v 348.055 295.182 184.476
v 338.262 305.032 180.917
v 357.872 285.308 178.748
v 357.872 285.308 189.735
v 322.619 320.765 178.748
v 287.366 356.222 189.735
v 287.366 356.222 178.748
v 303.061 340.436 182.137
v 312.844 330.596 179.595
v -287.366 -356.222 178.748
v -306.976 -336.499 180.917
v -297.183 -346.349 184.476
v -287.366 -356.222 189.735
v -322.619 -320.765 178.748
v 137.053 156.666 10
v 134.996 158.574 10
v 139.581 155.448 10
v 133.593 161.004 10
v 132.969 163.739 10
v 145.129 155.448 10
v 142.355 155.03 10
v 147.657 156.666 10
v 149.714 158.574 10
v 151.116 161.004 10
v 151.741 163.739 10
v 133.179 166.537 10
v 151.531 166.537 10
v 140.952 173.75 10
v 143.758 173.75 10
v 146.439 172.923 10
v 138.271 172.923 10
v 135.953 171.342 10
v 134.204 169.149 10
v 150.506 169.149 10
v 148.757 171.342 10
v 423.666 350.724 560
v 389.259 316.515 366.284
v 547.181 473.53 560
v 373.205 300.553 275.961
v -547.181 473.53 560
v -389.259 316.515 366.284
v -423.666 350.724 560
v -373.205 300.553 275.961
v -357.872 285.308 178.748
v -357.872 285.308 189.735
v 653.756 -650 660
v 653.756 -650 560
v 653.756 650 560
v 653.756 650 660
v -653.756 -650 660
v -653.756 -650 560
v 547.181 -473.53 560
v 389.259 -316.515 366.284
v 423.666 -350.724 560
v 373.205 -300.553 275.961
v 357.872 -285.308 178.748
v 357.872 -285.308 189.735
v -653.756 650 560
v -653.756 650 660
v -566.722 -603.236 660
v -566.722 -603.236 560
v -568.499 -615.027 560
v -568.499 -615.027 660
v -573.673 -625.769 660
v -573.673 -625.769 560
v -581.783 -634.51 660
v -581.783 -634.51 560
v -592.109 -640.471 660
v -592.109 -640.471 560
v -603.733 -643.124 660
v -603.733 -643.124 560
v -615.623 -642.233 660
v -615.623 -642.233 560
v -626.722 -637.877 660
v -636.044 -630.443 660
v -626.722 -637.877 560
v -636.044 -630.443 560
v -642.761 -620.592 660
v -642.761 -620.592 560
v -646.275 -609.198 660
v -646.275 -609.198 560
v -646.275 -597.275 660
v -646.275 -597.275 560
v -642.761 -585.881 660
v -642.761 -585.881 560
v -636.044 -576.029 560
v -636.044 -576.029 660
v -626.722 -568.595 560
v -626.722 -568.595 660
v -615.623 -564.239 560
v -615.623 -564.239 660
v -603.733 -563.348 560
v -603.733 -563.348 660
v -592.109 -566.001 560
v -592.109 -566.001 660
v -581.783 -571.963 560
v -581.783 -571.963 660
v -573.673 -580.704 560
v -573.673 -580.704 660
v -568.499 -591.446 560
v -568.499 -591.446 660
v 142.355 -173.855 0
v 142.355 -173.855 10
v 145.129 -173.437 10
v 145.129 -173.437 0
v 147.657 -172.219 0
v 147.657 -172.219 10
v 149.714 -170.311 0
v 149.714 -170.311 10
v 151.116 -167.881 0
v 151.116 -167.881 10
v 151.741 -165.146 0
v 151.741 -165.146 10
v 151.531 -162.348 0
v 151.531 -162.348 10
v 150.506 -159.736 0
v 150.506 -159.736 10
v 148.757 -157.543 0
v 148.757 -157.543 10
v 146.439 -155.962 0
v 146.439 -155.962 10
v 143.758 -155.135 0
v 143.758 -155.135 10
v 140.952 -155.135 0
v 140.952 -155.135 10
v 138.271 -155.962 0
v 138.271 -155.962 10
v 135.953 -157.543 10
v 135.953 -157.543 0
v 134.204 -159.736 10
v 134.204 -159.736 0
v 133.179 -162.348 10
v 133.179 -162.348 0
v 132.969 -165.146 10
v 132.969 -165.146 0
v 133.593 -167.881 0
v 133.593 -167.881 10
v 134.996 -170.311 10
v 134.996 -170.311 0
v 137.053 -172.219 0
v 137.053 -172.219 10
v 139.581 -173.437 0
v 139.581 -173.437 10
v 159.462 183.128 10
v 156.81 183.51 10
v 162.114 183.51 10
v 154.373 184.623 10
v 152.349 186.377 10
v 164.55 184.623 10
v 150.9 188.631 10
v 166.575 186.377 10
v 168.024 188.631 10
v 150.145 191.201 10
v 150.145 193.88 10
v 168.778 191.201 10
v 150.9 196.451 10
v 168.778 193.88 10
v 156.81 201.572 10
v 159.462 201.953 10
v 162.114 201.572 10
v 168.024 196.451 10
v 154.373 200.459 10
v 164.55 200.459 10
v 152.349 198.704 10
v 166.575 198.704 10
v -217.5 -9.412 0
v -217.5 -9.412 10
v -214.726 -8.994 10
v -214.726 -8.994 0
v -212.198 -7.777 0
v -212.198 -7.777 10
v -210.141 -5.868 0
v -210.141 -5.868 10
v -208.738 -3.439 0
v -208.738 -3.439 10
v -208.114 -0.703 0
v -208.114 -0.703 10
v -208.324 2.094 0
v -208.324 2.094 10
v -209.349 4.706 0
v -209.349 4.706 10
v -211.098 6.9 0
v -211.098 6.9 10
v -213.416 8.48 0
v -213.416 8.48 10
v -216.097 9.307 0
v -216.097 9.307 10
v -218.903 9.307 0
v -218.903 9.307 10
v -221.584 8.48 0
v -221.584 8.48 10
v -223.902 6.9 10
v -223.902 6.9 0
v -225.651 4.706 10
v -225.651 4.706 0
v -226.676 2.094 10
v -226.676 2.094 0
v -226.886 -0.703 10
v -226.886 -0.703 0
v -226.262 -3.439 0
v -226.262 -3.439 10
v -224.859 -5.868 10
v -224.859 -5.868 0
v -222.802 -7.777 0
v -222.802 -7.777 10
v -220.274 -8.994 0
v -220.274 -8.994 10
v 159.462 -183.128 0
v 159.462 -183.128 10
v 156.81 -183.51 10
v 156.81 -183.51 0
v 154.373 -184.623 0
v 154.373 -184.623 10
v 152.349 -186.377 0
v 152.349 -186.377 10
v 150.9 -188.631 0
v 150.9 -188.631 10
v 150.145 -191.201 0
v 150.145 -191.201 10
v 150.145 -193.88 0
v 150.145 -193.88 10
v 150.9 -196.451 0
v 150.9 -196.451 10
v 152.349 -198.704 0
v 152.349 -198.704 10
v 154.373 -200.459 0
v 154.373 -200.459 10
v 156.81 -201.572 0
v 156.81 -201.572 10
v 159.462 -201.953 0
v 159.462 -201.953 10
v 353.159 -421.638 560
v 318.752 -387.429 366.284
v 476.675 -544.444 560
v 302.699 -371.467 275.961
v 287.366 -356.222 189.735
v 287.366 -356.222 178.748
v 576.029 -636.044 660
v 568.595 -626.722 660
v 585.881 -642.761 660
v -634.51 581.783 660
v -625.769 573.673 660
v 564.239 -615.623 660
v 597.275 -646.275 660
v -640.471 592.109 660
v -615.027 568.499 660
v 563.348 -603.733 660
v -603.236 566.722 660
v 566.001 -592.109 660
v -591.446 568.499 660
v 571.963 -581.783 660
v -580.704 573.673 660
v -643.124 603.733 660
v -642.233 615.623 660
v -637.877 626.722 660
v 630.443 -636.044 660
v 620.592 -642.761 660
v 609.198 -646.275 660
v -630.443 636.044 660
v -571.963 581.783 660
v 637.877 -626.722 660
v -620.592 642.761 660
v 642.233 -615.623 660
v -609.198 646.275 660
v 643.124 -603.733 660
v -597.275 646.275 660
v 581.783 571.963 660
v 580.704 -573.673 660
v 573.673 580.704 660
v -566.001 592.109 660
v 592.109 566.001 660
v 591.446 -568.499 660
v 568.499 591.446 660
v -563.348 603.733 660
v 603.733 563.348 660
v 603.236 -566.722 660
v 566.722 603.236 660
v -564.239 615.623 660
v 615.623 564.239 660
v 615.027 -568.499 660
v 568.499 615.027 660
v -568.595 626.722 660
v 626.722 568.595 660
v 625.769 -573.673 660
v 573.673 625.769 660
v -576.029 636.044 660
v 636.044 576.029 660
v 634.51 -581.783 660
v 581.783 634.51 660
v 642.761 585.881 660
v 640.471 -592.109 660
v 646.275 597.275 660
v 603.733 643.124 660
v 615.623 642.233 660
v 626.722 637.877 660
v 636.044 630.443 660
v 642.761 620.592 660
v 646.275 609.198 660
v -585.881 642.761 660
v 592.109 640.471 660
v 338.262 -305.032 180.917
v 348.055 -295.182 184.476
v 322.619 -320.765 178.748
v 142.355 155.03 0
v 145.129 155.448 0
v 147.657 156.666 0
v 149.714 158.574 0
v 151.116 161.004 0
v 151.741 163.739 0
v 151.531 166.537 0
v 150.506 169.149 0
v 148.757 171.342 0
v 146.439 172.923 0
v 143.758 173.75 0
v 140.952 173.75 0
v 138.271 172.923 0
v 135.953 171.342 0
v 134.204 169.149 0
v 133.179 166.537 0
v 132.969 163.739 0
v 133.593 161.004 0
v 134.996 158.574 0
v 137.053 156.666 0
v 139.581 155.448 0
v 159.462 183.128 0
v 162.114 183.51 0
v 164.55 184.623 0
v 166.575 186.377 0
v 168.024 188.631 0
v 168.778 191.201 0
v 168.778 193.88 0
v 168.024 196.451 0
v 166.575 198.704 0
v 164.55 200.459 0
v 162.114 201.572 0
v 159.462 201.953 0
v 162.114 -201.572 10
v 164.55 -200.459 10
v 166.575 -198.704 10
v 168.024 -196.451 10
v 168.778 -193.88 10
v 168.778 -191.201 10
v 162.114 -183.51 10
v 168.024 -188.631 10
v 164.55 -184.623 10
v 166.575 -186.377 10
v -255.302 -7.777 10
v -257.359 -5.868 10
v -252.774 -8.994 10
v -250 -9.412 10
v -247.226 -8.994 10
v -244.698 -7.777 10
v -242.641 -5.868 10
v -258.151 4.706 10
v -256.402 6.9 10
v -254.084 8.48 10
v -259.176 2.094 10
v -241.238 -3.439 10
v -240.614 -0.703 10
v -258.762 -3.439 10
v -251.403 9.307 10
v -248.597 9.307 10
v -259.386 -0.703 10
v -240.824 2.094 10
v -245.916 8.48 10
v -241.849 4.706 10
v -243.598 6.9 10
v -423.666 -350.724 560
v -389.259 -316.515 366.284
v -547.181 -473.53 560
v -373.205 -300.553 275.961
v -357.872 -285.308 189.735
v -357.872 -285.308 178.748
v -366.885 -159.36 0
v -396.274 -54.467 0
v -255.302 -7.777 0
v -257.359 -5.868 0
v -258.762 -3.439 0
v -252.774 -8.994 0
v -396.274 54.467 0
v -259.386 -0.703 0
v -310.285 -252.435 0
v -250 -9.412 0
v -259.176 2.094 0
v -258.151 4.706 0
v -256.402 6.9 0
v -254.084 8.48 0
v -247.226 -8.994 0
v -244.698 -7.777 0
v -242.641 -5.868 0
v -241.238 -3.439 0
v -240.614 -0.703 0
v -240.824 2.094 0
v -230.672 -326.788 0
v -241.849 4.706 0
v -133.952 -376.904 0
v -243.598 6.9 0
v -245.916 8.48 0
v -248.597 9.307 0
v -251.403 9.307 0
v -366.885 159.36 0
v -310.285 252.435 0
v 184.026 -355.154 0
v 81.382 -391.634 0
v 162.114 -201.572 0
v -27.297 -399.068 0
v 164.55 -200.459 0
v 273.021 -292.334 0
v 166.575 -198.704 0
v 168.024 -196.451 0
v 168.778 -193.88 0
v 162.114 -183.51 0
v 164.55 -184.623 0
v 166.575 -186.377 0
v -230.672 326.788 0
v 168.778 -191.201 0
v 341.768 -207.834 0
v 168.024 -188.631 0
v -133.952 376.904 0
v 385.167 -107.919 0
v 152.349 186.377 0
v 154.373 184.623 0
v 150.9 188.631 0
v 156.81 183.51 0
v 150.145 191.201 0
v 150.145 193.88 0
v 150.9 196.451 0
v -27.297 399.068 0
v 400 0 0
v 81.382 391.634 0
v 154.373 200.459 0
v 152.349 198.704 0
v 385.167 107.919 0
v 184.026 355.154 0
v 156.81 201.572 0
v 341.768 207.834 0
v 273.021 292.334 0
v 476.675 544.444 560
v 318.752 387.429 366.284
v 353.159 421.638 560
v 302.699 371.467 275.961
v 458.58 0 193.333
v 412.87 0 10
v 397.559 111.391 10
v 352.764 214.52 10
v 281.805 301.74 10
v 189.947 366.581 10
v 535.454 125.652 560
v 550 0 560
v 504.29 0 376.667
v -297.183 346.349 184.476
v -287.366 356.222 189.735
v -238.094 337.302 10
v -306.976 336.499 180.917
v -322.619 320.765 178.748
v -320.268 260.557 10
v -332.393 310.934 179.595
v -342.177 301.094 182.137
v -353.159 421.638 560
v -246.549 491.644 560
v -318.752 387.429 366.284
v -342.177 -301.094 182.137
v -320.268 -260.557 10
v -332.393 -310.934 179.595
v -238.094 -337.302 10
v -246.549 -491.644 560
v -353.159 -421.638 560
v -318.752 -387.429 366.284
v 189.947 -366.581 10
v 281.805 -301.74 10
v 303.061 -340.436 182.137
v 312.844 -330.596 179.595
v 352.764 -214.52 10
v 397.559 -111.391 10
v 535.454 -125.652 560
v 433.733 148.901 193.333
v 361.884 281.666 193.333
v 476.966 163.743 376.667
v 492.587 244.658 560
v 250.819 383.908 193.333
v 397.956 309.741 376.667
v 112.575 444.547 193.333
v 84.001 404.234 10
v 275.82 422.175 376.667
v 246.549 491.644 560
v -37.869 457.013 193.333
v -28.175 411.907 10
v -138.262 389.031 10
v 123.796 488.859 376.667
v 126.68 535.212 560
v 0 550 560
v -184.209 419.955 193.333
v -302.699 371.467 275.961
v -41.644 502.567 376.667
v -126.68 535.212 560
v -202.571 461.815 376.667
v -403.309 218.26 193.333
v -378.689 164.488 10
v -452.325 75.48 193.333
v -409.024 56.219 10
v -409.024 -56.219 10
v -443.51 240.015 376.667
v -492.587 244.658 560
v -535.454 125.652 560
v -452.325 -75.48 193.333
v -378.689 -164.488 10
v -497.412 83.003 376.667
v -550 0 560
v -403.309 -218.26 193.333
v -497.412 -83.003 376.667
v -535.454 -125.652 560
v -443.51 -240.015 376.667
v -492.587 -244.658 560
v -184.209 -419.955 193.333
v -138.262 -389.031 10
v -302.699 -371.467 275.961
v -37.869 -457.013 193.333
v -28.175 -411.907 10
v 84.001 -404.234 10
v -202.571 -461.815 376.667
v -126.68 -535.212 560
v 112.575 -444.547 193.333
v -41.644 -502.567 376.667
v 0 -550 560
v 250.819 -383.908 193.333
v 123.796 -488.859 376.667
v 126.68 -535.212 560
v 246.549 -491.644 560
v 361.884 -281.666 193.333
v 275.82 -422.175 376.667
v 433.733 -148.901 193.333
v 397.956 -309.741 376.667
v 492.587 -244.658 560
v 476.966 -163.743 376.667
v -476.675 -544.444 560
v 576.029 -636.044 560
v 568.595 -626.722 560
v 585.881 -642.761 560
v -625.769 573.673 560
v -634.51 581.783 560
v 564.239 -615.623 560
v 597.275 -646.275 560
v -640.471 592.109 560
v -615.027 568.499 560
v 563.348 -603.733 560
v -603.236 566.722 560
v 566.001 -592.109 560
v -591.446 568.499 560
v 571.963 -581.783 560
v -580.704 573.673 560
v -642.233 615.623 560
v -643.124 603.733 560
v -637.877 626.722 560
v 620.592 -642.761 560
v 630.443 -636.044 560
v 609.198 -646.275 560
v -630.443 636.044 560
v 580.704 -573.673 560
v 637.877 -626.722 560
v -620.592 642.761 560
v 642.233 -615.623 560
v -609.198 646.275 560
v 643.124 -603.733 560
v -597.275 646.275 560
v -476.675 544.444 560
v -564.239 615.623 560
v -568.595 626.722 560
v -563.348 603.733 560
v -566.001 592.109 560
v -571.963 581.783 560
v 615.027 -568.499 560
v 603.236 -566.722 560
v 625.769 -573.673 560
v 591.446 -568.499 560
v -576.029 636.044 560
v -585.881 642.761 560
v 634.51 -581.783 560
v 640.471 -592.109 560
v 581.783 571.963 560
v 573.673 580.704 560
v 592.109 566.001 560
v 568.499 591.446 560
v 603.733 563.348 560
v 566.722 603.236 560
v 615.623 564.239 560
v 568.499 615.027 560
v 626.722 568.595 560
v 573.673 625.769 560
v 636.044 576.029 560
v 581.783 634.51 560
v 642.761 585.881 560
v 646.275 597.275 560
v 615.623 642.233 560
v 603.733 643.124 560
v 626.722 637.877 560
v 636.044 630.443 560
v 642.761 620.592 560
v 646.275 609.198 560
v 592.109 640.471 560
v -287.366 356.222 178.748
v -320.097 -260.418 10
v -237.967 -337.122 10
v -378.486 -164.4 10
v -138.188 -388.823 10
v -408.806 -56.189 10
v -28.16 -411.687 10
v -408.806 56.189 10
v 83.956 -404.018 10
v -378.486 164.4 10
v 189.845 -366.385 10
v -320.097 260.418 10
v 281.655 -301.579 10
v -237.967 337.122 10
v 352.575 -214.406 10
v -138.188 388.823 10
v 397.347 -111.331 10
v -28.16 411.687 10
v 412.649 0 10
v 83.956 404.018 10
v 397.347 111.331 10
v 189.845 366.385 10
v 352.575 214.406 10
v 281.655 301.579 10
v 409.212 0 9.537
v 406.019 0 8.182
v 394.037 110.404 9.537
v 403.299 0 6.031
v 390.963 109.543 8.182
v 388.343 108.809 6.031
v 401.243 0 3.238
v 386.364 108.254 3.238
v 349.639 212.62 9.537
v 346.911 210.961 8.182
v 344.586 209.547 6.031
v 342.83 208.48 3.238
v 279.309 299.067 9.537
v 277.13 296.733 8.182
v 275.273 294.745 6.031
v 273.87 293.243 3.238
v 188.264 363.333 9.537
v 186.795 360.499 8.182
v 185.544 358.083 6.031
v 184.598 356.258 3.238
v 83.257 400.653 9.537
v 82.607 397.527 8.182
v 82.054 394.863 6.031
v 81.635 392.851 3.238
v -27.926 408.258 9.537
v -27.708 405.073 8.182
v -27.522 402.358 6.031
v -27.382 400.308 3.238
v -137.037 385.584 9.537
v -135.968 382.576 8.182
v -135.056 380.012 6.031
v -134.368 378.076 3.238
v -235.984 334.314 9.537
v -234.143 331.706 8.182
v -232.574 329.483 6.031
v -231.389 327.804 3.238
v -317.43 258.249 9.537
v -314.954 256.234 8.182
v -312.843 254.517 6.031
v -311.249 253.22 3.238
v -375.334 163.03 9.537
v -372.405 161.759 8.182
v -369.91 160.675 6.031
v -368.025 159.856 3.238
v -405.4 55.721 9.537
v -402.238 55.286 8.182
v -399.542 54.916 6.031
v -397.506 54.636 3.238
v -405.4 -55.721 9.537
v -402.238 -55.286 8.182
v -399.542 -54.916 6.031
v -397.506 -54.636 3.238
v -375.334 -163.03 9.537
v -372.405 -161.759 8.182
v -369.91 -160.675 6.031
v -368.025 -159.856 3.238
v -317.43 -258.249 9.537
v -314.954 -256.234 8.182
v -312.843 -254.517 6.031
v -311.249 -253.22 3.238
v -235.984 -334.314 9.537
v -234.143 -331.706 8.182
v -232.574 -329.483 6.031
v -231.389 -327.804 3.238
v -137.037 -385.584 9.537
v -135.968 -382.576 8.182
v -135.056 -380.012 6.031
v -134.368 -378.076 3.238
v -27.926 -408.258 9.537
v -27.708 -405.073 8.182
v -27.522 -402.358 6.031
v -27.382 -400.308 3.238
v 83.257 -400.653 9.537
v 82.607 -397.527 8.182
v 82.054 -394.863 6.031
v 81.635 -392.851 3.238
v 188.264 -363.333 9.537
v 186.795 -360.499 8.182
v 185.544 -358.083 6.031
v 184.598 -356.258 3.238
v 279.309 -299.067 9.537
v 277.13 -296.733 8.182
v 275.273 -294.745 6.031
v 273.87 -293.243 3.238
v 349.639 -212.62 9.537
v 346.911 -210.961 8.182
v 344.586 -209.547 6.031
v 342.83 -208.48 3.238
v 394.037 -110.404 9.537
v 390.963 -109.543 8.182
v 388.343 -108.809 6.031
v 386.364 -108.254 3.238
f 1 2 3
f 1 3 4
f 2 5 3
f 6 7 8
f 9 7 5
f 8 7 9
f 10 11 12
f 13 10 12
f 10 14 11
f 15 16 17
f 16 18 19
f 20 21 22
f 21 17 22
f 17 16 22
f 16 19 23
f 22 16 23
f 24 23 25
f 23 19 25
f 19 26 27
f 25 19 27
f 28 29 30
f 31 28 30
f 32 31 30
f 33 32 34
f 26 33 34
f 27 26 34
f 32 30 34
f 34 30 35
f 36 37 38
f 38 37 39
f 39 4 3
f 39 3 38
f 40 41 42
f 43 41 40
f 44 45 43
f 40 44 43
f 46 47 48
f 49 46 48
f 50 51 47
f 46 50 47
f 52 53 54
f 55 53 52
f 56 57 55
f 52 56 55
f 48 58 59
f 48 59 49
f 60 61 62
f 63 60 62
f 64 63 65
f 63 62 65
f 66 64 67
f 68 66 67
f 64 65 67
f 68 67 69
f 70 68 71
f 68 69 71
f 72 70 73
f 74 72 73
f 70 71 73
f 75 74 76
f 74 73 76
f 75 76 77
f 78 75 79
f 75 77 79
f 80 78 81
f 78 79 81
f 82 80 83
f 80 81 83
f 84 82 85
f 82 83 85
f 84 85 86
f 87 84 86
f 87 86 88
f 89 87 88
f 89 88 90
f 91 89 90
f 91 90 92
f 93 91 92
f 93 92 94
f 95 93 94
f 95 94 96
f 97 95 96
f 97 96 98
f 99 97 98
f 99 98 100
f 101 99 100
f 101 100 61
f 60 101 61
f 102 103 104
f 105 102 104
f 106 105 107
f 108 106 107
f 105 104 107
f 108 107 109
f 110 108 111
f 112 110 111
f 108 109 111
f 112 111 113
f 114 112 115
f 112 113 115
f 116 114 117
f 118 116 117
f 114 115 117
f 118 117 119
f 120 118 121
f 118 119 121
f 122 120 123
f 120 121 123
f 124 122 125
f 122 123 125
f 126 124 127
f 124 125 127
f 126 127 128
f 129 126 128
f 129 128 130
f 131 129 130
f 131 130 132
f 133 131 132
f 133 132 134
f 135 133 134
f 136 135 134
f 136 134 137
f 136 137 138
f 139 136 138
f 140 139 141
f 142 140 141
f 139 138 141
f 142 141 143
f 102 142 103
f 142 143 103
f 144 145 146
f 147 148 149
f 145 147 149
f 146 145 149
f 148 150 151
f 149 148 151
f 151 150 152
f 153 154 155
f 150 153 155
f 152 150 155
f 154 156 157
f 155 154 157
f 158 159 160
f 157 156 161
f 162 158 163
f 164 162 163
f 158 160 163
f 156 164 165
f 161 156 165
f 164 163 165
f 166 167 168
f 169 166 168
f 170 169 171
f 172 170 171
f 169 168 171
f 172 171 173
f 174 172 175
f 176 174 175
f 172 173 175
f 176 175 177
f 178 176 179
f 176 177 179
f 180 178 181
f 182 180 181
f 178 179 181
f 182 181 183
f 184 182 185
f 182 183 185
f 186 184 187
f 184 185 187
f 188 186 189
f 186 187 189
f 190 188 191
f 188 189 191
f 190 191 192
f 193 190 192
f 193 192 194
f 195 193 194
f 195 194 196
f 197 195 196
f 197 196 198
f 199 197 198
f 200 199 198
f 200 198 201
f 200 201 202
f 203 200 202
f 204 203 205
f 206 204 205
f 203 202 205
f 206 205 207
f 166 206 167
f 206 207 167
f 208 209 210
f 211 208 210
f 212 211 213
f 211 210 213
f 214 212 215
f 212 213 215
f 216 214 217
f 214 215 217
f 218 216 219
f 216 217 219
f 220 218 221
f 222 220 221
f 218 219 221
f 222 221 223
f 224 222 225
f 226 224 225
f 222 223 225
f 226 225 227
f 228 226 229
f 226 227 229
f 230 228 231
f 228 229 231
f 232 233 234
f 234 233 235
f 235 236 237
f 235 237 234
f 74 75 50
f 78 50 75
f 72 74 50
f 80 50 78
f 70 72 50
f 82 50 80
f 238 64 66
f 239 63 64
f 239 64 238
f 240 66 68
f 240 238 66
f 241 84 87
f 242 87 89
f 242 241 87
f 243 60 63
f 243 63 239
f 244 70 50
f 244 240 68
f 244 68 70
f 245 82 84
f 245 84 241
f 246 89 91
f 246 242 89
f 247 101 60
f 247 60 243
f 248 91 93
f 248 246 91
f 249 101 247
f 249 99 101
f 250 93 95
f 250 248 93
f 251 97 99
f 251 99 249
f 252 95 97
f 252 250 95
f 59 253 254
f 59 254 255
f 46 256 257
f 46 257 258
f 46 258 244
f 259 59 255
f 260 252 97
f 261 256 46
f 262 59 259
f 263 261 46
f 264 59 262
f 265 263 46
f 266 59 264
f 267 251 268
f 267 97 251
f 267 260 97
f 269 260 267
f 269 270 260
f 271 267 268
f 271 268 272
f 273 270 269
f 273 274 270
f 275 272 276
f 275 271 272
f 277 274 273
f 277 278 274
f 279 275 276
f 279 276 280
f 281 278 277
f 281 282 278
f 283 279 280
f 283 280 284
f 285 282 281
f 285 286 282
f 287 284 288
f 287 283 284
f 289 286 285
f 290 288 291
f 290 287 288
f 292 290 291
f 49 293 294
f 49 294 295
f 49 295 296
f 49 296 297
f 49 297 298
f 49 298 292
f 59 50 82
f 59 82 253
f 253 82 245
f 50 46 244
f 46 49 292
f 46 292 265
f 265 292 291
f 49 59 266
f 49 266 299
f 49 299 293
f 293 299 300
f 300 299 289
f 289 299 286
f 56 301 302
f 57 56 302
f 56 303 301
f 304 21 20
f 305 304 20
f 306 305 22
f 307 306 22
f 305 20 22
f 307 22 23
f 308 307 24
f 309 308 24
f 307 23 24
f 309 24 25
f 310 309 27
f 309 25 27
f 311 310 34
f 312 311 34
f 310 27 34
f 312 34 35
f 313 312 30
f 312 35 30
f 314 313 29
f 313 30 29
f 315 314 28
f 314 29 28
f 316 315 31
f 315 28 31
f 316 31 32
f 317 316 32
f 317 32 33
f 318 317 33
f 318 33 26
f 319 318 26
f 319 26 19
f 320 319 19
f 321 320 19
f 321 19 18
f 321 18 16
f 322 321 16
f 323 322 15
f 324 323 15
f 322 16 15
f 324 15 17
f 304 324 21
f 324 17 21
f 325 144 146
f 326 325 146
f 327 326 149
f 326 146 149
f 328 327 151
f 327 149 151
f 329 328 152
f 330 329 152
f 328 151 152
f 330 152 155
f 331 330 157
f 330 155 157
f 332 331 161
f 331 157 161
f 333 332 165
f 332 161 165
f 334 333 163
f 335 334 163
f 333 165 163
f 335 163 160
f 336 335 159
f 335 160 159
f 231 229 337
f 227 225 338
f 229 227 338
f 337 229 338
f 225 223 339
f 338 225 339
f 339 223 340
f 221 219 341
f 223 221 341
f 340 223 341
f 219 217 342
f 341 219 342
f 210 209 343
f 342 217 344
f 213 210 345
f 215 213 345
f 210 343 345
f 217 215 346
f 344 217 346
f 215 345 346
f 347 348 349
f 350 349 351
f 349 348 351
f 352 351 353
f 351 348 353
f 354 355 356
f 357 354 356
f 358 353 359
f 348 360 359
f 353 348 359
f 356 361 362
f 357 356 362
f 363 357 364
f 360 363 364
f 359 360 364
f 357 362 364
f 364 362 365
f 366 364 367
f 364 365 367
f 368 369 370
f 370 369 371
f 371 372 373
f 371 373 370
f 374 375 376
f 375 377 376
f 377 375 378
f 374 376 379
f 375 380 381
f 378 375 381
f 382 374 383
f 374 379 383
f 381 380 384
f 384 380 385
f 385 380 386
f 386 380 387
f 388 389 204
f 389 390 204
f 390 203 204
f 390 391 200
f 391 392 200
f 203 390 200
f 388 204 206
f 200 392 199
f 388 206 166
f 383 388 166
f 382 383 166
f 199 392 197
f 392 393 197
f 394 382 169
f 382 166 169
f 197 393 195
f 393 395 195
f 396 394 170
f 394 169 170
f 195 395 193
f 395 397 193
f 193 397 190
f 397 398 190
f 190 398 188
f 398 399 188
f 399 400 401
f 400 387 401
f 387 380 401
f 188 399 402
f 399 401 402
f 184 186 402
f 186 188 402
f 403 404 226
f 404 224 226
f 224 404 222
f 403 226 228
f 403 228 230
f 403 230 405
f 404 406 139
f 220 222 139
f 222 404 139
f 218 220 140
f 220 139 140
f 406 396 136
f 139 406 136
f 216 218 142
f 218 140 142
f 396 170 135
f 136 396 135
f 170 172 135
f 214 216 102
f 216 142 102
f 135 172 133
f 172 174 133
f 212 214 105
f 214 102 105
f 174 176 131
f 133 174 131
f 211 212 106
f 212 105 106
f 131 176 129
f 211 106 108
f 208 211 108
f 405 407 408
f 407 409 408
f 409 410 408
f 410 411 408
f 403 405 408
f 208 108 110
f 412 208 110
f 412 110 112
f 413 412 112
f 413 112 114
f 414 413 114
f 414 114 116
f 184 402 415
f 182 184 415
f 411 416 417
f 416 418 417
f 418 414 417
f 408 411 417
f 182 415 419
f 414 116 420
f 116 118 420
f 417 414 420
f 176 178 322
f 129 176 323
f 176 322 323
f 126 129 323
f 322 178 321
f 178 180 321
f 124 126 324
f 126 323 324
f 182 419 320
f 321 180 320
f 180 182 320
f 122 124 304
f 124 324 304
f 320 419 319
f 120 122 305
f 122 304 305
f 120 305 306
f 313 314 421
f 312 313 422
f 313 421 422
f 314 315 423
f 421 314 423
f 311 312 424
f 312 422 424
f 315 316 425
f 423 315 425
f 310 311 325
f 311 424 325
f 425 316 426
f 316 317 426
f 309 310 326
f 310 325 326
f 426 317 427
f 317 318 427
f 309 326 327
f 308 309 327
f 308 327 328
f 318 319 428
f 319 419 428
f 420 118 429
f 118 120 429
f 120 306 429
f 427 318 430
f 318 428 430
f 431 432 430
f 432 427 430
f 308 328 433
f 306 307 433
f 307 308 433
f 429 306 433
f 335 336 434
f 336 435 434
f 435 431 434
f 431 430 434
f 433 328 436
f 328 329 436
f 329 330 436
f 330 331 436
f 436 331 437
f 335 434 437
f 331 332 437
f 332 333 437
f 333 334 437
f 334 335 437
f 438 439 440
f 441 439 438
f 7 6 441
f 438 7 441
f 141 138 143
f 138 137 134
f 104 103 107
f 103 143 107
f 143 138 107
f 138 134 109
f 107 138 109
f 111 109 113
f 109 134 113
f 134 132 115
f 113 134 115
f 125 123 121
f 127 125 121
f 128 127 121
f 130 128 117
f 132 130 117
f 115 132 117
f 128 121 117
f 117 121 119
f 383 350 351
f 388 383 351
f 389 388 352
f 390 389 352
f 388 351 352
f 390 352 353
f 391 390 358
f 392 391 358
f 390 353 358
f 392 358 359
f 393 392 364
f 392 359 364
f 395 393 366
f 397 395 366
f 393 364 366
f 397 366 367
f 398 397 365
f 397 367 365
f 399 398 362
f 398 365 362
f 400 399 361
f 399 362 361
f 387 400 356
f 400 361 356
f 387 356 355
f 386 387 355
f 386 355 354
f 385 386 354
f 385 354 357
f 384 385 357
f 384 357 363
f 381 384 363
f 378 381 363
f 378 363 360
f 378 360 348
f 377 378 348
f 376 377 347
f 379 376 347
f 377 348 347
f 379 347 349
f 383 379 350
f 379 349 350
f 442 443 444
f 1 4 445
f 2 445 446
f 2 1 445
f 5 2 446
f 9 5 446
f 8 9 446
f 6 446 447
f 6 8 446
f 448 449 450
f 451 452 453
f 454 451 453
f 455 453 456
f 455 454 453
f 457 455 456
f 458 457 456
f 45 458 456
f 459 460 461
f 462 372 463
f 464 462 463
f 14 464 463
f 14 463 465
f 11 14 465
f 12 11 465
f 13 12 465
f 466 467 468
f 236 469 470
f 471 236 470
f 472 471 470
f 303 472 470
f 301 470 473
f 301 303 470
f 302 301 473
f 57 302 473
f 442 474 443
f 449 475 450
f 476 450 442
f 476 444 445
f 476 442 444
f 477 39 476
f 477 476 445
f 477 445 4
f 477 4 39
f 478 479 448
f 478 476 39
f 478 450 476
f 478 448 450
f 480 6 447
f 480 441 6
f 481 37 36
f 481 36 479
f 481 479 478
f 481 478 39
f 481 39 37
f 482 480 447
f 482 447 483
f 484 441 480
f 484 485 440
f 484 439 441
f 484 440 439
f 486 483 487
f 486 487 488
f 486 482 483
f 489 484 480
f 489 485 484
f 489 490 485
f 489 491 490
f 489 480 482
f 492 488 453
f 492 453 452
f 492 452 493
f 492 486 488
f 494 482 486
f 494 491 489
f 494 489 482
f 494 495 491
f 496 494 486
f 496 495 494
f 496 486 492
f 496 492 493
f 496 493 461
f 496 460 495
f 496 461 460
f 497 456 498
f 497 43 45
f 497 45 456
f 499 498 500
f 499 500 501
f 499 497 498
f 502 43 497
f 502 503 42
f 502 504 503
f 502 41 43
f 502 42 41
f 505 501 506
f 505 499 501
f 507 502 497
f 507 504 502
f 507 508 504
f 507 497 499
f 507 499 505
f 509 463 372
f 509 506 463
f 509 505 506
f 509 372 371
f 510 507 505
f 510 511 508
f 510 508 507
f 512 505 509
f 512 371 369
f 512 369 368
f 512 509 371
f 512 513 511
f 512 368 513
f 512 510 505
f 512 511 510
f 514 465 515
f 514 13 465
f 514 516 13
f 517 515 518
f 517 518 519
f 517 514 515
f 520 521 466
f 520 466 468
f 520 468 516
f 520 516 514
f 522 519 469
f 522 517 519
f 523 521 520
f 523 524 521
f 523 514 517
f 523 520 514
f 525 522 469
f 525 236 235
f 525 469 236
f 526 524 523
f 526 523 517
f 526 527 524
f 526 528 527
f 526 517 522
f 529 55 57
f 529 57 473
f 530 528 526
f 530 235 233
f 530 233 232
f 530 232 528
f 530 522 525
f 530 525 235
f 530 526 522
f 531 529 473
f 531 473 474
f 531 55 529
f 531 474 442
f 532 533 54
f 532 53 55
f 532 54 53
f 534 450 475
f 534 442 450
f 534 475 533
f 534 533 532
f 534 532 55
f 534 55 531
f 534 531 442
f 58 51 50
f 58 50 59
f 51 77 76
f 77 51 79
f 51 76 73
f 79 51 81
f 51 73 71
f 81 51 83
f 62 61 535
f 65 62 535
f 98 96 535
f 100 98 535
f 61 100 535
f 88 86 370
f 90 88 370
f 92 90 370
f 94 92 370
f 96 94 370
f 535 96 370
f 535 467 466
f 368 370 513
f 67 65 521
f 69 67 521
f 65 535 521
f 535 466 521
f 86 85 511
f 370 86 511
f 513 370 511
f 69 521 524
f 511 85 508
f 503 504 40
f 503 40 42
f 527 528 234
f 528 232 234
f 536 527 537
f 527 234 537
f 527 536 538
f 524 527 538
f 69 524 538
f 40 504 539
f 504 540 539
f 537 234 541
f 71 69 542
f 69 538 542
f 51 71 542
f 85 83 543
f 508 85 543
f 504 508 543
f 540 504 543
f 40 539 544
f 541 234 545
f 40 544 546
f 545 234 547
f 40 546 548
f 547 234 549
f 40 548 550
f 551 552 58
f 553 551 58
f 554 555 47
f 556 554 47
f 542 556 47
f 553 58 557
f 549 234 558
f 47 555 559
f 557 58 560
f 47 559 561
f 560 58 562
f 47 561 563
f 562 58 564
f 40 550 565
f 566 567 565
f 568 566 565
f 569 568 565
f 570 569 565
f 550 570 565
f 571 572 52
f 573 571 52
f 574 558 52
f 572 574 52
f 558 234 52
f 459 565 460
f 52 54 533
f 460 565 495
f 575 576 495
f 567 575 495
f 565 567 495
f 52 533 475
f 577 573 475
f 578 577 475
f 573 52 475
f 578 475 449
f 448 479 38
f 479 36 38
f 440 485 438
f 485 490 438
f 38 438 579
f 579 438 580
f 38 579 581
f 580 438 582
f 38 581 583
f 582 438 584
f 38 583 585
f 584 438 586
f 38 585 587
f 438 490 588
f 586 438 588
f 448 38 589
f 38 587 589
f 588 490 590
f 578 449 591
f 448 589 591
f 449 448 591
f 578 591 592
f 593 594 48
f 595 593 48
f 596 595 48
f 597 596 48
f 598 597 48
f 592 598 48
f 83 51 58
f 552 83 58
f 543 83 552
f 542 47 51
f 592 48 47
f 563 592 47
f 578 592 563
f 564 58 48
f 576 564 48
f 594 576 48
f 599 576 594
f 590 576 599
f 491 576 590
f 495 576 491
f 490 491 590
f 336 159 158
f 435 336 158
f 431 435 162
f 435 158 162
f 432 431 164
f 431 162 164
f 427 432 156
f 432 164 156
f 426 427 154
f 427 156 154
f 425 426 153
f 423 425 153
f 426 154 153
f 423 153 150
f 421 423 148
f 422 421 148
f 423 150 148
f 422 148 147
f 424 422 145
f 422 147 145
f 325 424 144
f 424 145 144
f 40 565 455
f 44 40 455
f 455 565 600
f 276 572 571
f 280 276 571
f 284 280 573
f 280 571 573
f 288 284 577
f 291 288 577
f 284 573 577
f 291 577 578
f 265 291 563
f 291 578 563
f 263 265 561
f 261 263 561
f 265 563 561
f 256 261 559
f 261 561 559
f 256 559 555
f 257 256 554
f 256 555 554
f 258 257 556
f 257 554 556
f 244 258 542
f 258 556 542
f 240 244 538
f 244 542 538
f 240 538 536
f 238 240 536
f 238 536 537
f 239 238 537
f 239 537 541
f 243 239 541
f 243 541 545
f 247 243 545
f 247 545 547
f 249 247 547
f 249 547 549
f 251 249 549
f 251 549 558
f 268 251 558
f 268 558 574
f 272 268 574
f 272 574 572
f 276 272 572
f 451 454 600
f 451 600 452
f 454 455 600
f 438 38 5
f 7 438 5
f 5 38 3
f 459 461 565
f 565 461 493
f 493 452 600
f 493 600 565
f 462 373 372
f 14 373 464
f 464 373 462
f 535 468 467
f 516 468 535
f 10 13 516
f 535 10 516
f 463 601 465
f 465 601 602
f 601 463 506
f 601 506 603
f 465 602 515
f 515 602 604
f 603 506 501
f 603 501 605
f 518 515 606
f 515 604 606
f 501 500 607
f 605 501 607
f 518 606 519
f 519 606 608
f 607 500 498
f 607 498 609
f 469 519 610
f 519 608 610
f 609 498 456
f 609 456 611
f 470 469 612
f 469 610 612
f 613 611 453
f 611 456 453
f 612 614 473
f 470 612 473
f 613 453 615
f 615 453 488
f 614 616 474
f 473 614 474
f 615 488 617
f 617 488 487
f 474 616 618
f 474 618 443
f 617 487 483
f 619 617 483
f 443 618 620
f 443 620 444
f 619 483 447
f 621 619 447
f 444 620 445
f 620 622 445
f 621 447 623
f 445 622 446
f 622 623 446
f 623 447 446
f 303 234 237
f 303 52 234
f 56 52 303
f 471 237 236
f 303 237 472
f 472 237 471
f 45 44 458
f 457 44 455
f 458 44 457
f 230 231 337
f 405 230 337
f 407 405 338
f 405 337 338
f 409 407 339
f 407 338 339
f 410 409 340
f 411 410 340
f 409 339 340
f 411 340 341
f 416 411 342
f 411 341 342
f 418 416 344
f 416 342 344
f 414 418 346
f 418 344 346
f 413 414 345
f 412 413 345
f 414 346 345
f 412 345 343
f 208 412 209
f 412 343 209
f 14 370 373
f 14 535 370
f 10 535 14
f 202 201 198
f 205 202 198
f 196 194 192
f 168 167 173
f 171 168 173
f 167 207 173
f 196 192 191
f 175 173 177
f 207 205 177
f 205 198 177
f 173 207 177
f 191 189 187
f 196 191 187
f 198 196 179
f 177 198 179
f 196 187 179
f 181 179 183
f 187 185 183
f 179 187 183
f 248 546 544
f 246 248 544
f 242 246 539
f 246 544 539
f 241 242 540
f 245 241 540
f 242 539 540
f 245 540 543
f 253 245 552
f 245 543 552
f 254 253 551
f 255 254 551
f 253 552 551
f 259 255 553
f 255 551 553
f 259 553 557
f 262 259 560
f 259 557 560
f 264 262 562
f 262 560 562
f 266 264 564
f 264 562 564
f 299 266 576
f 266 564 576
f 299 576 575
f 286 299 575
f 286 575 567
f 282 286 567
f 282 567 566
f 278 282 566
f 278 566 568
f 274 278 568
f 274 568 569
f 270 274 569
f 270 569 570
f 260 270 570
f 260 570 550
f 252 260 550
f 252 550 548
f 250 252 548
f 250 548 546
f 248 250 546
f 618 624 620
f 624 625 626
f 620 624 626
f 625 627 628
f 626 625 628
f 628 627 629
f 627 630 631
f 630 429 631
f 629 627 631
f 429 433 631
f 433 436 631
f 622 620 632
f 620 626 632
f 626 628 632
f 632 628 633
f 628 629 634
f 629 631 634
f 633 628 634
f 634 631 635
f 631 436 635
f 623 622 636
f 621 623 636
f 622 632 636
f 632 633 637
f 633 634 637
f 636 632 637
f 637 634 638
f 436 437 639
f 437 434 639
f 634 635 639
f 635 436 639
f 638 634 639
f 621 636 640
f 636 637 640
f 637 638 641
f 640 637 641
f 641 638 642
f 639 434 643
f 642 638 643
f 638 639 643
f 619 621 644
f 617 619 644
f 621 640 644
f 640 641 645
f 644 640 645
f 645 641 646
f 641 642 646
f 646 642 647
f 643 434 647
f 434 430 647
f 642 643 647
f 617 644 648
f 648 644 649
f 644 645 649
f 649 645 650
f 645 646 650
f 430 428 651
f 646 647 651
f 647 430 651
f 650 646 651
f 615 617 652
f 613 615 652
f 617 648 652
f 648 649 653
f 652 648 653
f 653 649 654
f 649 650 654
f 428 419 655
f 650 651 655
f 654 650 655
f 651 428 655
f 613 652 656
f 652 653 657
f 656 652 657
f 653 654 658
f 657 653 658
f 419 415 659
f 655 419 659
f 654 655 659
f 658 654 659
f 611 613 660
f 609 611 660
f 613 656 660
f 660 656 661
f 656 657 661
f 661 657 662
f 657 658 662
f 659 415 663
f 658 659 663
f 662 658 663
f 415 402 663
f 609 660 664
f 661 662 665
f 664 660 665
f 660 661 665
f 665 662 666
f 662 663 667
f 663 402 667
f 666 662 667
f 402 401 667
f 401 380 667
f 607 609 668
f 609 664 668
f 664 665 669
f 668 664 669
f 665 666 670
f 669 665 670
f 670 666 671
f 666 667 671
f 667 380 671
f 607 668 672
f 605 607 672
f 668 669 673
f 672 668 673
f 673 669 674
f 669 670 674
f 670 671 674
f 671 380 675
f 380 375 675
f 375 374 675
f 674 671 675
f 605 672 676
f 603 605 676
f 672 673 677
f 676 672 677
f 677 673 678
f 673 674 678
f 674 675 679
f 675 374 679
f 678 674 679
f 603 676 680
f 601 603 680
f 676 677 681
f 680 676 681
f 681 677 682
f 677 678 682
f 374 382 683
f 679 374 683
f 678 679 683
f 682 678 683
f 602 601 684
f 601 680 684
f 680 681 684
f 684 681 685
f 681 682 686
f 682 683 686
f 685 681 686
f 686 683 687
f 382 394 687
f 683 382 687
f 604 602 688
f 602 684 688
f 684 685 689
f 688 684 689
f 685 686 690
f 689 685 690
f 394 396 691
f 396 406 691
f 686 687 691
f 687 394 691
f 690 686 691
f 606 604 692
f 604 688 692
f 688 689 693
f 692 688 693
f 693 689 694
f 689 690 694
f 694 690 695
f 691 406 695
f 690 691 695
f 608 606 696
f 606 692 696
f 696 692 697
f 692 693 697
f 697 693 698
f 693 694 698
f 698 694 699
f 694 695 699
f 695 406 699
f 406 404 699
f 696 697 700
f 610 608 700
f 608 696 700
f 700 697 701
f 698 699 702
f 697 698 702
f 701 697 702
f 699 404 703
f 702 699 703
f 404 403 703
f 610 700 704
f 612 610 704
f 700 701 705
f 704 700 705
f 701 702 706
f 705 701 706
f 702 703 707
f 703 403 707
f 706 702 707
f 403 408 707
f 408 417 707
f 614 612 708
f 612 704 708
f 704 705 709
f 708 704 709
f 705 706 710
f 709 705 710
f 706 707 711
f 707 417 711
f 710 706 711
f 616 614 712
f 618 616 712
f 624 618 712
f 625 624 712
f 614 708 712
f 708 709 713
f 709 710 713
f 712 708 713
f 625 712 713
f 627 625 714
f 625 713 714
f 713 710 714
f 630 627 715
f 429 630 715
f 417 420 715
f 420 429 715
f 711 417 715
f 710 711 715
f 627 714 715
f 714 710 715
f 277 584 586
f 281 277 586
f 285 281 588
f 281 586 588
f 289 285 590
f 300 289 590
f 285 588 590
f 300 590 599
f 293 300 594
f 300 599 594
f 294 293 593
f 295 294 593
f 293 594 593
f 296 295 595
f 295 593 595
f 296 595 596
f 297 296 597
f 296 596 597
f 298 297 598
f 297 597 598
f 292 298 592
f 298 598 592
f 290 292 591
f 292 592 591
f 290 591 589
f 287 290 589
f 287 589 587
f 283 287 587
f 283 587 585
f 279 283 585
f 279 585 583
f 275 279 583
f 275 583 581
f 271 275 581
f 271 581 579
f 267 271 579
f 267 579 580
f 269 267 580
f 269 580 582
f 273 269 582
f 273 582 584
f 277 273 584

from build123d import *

# Parameters (mm, degrees)
SCHIZZO1_R                      = 400
ESTRUSIONE_ESTRUSIONE2_DEPTH    = 10
SCHIZZO2_R                      = 550
ESTRUSIONE_ESTRUSIONE3_DEPTH    = 550
ESTRUSIONE_ESTRUSIONE3_DRAFT    = -14
SCHIZZO7_W                      = 1307.512156596
SCHIZZO7_H                      = 1300
SCHIZZO7_R                      = 550
ESTRUSIONE_ESTRUSIONE4_DEPTH    = 100
ESTRUSIONE_ESTRUSIONE15_DEPTH   = 50
SCHIZZO16_R                     = 40
TAGLIO_ESTRUSIONE1_DEPTH        = 183
ESTRUSIONE_ESTRUSIONE21_DEPTH   = 50
ESTRUSIONE_ESTRUSIONE23_DEPTH   = 50
ESTRUSIONE_ESTRUSIONE23_2_DEPTH = 50
RIPETIZIONECIRCOLARE3_COUNT     = 4
SCHIZZO19_R                     = 550
ESTRUSIONE_ESTRUSIONE24_DEPTH   = 100
RACCORDO1_R                     = 13


with BuildPart() as part:
    # Schizzo1 → Estrusione-Estrusione2 (new body)
    with BuildSketch(Plane.XY.offset(10)):
        Circle(SCHIZZO1_R)
        with BuildLine():
            ThreePointArc((159.461880199, 183.128480143), (168.874067872, 192.540667817), (159.461880199, 201.952855491))
            ThreePointArc((159.461880199, 201.952855491), (150.049692525, 192.540667817), (159.461880199, 183.128480143))
        make_face(mode=Mode.SUBTRACT)
        with BuildLine():
            ThreePointArc((142.354854673, 173.854716695), (132.942666999, 164.442529021), (142.354854673, 155.030341347))
            ThreePointArc((142.354854673, 155.030341347), (151.767042347, 164.442529021), (142.354854673, 173.854716695))
        make_face(mode=Mode.SUBTRACT)
        with BuildLine():
            ThreePointArc((142.354854673, -155.030341347), (132.942666999, -164.442529021), (142.354854673, -173.854716695))
            ThreePointArc((142.354854673, -173.854716695), (151.767042347, -164.442529021), (142.354854673, -155.030341347))
        make_face(mode=Mode.SUBTRACT)
        with BuildLine():
            ThreePointArc((159.461880199, -183.128480143), (150.049692525, -192.540667817), (159.461880199, -201.952855491))
            ThreePointArc((159.461880199, -201.952855491), (168.874067872, -192.540667817), (159.461880199, -183.128480143))
        make_face(mode=Mode.SUBTRACT)
        with BuildLine():
            ThreePointArc((-217.5, 9.412187674), (-226.912187674, 0), (-217.5, -9.412187674))
            ThreePointArc((-217.5, -9.412187674), (-208.087812326, 0), (-217.5, 9.412187674))
        make_face(mode=Mode.SUBTRACT)
        with BuildLine():
            ThreePointArc((-250, 9.412187674), (-259.412187674, 0), (-250, -9.412187674))
            ThreePointArc((-250, -9.412187674), (-240.587812326, 0), (-250, 9.412187674))
        make_face(mode=Mode.SUBTRACT)
    extrude(amount=-ESTRUSIONE_ESTRUSIONE2_DEPTH)


with BuildPart() as estrusione_estrusione3_tool:
    # Schizzo2 → Estrusione-Estrusione3 (with draft: the straight prism first)
    with BuildSketch(Plane.XY.offset(560)):
        Circle(SCHIZZO2_R)
    extrude(amount=-ESTRUSIONE_ESTRUSIONE3_DEPTH)
    # Estrusione-Estrusione3: the draft: its side faces are tilted about the plane it starts from
    estrusione_estrusione3_sides = [estrusione_estrusione3_tool.faces().sort_by_distance(p)[0] for p in [
        (-550, 0, 285),
    ]]
    draft(estrusione_estrusione3_sides, Plane.XY.offset(560), ESTRUSIONE_ESTRUSIONE3_DRAFT)


with BuildPart() as part_1:
    add(part.part)

    # Estrusione-Estrusione3: add estrusione_estrusione3_tool
    add(estrusione_estrusione3_tool.part)



with BuildPart() as body_2:
    # Schizzo7 → Estrusione-Estrusione4 (new body)
    with BuildSketch(Plane.XY.offset(560)):
        Rectangle(SCHIZZO7_W, SCHIZZO7_H)
        Circle(SCHIZZO7_R, mode=Mode.SUBTRACT)
    extrude(amount=ESTRUSIONE_ESTRUSIONE4_DEPTH)

    # Schizzo16 → Taglio-Estrusione1 (cut)
    with BuildSketch(Plane(origin=(0, 0, 560), x_dir=(-1, 0, 0), z_dir=(0, 0, -1))):
        with Locations((-606.722155674, 603.236305221)):
            Circle(SCHIZZO16_R)
    taglio_estrusione1 = extrude(amount=-TAGLIO_ESTRUSIONE1_DEPTH, mode=Mode.SUBTRACT)

    # RipetizioneCircolare3: Taglio-Estrusione1 ×4 about axis
    ripetizionecircolare3_axis = Axis((0, 0, 0), (0, 0, 1))
    for i in range(1, RIPETIZIONECIRCOLARE3_COUNT):
        add(taglio_estrusione1.rotate(ripetizionecircolare3_axis, i * 360 / RIPETIZIONECIRCOLARE3_COUNT), mode=Mode.SUBTRACT)


with BuildPart() as body_3:
    # Schizzo15 → Estrusione-Estrusione15 (new, symmetric)
    with BuildSketch(Plane(origin=(0, 0, 0), x_dir=(-0.7091409896026719, -0.7050667038410928, 0), z_dir=(0.7050667038410928, -0.7091409896026719, 0))):
        Polygon((-721.89858982, -560), (-454.943274801, -178.748298966), (-454.943274801, -560), align=None)
    extrude(amount=ESTRUSIONE_ESTRUSIONE15_DEPTH, both=True)


with BuildPart() as body_4:
    # Schizzo17 → Estrusione-Estrusione21 (new, symmetric)
    with BuildSketch(Plane(origin=(0, 0, 0), x_dir=(-0.7091409896026719, -0.7050667038410928, 0), z_dir=(0.7050667038410928, -0.7091409896026719, 0))):
        Polygon((721.89858982, -560), (454.943274801, -178.748298966), (454.943274801, -560), align=None)
    extrude(amount=ESTRUSIONE_ESTRUSIONE21_DEPTH, both=True)


with BuildPart() as body_5:
    # Schizzo18 → Estrusione-Estrusione23 (new, symmetric)
    with BuildSketch(Plane(origin=(0, 0, 0), x_dir=(0.7091409896026718, -0.7050667038410929, 0), z_dir=(0.7050667038410929, 0.7091409896026718, 0))):
        Polygon((-721.89858982, -560), (-454.943274801, -178.748298966), (-454.943274801, -560), align=None)
    extrude(amount=ESTRUSIONE_ESTRUSIONE23_DEPTH, both=True)


with BuildPart() as body_6:
    # Schizzo18 → Estrusione-Estrusione23 2 (new, symmetric)
    with BuildSketch(Plane(origin=(0, 0, 0), x_dir=(0.7091409896026718, -0.7050667038410929, 0), z_dir=(0.7050667038410929, 0.7091409896026718, 0))):
        Polygon((721.89858982, -560), (454.943274801, -178.748298966), (454.943274801, -560), align=None)
    extrude(amount=ESTRUSIONE_ESTRUSIONE23_2_DEPTH, both=True)


with BuildPart() as part_2:
    add(part_1.part)

    add(body_2.part)  # Estrusione-Estrusione24 merges body 2

    add(body_3.part)  # Estrusione-Estrusione24 merges body 3

    add(body_4.part)  # Estrusione-Estrusione24 merges body 4

    add(body_5.part)  # Estrusione-Estrusione24 merges body 5

    add(body_6.part)  # Estrusione-Estrusione24 merges body 6
    # Schizzo19 → Estrusione-Estrusione24 (add)
    with BuildSketch(Plane.XY.offset(560)):
        Circle(SCHIZZO19_R)
    extrude(amount=ESTRUSIONE_ESTRUSIONE24_DEPTH)

    # Raccordo1
    # the kernel refuses this fillet: 13 mm, written as the material it adds along each edge
    with BuildSketch(Plane(origin=(0, 0, 10), x_dir=(1, 0, 0), z_dir=(0, -1, 0))) as raccordo1_piece_1:
        with BuildLine():
            CenterArc((412.649110641, -13), RACCORDO1_R, 90, 76.657636203)
            Line((400, -10), (400, 0))
            Line((400, 0), (412.649110641, 0))
        make_face()
    revolve(axis=Axis((0, 0, 10), (0, 0, 1)))


solid = part_2.part
